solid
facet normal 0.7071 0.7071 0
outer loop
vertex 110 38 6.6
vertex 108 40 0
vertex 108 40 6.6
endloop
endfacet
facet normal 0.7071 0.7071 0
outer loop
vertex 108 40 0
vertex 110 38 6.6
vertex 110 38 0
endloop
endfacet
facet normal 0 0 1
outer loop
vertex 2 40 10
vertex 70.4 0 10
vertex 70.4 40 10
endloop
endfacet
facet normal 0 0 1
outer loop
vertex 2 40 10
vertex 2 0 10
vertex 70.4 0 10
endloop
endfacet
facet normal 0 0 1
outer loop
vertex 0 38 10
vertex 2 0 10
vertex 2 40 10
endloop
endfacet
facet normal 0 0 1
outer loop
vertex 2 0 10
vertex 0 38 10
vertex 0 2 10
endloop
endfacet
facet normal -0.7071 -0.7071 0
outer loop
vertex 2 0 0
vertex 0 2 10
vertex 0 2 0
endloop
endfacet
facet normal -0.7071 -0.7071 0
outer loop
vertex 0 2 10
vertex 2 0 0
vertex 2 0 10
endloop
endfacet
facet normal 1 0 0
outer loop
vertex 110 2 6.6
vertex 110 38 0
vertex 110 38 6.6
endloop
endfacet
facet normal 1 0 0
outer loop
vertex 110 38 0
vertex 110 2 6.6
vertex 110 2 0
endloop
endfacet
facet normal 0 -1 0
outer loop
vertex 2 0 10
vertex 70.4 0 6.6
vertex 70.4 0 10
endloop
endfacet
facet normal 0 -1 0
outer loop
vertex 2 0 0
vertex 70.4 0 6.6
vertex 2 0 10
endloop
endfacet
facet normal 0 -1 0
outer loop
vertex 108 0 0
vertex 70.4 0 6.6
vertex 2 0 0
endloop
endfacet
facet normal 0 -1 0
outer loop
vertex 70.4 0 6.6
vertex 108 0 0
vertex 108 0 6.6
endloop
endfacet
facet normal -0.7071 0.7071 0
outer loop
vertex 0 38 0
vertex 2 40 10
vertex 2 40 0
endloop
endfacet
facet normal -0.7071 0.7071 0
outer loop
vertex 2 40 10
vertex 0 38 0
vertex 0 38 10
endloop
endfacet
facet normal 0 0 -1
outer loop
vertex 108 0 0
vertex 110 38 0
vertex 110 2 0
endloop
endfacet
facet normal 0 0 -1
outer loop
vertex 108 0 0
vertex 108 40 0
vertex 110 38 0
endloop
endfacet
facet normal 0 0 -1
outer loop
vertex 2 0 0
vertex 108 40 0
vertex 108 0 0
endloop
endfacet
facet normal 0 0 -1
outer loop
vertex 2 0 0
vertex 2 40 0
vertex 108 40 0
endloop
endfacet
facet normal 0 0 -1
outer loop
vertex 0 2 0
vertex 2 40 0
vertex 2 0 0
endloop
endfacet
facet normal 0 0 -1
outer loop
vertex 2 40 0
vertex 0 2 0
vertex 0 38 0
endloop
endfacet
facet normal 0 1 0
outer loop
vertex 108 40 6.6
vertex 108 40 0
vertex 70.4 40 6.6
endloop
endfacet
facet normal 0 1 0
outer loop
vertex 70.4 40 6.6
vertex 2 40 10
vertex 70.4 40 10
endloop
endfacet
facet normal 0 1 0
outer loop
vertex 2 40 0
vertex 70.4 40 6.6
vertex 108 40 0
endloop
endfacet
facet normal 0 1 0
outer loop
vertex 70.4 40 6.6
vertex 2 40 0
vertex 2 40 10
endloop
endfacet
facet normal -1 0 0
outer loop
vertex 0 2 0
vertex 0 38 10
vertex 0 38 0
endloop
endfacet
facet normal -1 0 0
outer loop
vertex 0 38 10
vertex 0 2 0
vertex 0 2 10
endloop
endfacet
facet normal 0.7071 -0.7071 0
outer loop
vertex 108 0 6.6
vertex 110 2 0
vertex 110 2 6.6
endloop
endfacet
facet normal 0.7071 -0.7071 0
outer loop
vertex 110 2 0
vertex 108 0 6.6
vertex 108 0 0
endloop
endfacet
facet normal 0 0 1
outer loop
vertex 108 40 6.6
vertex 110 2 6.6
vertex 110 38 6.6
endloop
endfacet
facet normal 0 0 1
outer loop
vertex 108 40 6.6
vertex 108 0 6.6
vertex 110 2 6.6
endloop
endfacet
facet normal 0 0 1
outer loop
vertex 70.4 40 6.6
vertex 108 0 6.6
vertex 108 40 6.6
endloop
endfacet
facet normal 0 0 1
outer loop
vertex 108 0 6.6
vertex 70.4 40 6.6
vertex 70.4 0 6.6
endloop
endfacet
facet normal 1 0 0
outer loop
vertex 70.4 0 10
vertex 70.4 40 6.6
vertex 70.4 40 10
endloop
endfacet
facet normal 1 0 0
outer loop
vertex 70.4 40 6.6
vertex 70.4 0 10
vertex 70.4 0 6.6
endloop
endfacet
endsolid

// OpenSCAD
$fn = 32;

// ----------------------------------------------------------------------
// Stepped bar: endstep, 110 x 40 x 10/6.6 mm
// ----------------------------------------------------------------------

// --- parameters (mm) ---
bar_l = 110;              // bar length, X
bar_w = 40;               // bar width, Y
plate_t = 10;             // thickness of the thick zone, Z
thin_t = 6.6;             // thickness of the thin zone
corner_c = 2;             // corner chamfer of the bar
step_cut = 3.4;           // material removed from the thin zone
step_x = 70.4;            // step position from the left end
depth_1 = 3.4;            // depth of cut 1 from the top face

profile = [[2, 0], [108, 0], [110, 2], [110, 38], [108, 40], [2, 40], [0, 38], [0, 2]];  // primary outline, 8 points, counter clockwise
void_1 = [[70.4, -1], [111, -1], [111, 41], [70.4, 41]];  // thin zone beyond the step, 4 points

// --- the one profile operation ---
difference() {
  linear_extrude(height = plate_t) polygon(points = profile);
  translate([0, 0, plate_t - depth_1])
    linear_extrude(height = depth_1 + 1) polygon(points = void_1);
}
